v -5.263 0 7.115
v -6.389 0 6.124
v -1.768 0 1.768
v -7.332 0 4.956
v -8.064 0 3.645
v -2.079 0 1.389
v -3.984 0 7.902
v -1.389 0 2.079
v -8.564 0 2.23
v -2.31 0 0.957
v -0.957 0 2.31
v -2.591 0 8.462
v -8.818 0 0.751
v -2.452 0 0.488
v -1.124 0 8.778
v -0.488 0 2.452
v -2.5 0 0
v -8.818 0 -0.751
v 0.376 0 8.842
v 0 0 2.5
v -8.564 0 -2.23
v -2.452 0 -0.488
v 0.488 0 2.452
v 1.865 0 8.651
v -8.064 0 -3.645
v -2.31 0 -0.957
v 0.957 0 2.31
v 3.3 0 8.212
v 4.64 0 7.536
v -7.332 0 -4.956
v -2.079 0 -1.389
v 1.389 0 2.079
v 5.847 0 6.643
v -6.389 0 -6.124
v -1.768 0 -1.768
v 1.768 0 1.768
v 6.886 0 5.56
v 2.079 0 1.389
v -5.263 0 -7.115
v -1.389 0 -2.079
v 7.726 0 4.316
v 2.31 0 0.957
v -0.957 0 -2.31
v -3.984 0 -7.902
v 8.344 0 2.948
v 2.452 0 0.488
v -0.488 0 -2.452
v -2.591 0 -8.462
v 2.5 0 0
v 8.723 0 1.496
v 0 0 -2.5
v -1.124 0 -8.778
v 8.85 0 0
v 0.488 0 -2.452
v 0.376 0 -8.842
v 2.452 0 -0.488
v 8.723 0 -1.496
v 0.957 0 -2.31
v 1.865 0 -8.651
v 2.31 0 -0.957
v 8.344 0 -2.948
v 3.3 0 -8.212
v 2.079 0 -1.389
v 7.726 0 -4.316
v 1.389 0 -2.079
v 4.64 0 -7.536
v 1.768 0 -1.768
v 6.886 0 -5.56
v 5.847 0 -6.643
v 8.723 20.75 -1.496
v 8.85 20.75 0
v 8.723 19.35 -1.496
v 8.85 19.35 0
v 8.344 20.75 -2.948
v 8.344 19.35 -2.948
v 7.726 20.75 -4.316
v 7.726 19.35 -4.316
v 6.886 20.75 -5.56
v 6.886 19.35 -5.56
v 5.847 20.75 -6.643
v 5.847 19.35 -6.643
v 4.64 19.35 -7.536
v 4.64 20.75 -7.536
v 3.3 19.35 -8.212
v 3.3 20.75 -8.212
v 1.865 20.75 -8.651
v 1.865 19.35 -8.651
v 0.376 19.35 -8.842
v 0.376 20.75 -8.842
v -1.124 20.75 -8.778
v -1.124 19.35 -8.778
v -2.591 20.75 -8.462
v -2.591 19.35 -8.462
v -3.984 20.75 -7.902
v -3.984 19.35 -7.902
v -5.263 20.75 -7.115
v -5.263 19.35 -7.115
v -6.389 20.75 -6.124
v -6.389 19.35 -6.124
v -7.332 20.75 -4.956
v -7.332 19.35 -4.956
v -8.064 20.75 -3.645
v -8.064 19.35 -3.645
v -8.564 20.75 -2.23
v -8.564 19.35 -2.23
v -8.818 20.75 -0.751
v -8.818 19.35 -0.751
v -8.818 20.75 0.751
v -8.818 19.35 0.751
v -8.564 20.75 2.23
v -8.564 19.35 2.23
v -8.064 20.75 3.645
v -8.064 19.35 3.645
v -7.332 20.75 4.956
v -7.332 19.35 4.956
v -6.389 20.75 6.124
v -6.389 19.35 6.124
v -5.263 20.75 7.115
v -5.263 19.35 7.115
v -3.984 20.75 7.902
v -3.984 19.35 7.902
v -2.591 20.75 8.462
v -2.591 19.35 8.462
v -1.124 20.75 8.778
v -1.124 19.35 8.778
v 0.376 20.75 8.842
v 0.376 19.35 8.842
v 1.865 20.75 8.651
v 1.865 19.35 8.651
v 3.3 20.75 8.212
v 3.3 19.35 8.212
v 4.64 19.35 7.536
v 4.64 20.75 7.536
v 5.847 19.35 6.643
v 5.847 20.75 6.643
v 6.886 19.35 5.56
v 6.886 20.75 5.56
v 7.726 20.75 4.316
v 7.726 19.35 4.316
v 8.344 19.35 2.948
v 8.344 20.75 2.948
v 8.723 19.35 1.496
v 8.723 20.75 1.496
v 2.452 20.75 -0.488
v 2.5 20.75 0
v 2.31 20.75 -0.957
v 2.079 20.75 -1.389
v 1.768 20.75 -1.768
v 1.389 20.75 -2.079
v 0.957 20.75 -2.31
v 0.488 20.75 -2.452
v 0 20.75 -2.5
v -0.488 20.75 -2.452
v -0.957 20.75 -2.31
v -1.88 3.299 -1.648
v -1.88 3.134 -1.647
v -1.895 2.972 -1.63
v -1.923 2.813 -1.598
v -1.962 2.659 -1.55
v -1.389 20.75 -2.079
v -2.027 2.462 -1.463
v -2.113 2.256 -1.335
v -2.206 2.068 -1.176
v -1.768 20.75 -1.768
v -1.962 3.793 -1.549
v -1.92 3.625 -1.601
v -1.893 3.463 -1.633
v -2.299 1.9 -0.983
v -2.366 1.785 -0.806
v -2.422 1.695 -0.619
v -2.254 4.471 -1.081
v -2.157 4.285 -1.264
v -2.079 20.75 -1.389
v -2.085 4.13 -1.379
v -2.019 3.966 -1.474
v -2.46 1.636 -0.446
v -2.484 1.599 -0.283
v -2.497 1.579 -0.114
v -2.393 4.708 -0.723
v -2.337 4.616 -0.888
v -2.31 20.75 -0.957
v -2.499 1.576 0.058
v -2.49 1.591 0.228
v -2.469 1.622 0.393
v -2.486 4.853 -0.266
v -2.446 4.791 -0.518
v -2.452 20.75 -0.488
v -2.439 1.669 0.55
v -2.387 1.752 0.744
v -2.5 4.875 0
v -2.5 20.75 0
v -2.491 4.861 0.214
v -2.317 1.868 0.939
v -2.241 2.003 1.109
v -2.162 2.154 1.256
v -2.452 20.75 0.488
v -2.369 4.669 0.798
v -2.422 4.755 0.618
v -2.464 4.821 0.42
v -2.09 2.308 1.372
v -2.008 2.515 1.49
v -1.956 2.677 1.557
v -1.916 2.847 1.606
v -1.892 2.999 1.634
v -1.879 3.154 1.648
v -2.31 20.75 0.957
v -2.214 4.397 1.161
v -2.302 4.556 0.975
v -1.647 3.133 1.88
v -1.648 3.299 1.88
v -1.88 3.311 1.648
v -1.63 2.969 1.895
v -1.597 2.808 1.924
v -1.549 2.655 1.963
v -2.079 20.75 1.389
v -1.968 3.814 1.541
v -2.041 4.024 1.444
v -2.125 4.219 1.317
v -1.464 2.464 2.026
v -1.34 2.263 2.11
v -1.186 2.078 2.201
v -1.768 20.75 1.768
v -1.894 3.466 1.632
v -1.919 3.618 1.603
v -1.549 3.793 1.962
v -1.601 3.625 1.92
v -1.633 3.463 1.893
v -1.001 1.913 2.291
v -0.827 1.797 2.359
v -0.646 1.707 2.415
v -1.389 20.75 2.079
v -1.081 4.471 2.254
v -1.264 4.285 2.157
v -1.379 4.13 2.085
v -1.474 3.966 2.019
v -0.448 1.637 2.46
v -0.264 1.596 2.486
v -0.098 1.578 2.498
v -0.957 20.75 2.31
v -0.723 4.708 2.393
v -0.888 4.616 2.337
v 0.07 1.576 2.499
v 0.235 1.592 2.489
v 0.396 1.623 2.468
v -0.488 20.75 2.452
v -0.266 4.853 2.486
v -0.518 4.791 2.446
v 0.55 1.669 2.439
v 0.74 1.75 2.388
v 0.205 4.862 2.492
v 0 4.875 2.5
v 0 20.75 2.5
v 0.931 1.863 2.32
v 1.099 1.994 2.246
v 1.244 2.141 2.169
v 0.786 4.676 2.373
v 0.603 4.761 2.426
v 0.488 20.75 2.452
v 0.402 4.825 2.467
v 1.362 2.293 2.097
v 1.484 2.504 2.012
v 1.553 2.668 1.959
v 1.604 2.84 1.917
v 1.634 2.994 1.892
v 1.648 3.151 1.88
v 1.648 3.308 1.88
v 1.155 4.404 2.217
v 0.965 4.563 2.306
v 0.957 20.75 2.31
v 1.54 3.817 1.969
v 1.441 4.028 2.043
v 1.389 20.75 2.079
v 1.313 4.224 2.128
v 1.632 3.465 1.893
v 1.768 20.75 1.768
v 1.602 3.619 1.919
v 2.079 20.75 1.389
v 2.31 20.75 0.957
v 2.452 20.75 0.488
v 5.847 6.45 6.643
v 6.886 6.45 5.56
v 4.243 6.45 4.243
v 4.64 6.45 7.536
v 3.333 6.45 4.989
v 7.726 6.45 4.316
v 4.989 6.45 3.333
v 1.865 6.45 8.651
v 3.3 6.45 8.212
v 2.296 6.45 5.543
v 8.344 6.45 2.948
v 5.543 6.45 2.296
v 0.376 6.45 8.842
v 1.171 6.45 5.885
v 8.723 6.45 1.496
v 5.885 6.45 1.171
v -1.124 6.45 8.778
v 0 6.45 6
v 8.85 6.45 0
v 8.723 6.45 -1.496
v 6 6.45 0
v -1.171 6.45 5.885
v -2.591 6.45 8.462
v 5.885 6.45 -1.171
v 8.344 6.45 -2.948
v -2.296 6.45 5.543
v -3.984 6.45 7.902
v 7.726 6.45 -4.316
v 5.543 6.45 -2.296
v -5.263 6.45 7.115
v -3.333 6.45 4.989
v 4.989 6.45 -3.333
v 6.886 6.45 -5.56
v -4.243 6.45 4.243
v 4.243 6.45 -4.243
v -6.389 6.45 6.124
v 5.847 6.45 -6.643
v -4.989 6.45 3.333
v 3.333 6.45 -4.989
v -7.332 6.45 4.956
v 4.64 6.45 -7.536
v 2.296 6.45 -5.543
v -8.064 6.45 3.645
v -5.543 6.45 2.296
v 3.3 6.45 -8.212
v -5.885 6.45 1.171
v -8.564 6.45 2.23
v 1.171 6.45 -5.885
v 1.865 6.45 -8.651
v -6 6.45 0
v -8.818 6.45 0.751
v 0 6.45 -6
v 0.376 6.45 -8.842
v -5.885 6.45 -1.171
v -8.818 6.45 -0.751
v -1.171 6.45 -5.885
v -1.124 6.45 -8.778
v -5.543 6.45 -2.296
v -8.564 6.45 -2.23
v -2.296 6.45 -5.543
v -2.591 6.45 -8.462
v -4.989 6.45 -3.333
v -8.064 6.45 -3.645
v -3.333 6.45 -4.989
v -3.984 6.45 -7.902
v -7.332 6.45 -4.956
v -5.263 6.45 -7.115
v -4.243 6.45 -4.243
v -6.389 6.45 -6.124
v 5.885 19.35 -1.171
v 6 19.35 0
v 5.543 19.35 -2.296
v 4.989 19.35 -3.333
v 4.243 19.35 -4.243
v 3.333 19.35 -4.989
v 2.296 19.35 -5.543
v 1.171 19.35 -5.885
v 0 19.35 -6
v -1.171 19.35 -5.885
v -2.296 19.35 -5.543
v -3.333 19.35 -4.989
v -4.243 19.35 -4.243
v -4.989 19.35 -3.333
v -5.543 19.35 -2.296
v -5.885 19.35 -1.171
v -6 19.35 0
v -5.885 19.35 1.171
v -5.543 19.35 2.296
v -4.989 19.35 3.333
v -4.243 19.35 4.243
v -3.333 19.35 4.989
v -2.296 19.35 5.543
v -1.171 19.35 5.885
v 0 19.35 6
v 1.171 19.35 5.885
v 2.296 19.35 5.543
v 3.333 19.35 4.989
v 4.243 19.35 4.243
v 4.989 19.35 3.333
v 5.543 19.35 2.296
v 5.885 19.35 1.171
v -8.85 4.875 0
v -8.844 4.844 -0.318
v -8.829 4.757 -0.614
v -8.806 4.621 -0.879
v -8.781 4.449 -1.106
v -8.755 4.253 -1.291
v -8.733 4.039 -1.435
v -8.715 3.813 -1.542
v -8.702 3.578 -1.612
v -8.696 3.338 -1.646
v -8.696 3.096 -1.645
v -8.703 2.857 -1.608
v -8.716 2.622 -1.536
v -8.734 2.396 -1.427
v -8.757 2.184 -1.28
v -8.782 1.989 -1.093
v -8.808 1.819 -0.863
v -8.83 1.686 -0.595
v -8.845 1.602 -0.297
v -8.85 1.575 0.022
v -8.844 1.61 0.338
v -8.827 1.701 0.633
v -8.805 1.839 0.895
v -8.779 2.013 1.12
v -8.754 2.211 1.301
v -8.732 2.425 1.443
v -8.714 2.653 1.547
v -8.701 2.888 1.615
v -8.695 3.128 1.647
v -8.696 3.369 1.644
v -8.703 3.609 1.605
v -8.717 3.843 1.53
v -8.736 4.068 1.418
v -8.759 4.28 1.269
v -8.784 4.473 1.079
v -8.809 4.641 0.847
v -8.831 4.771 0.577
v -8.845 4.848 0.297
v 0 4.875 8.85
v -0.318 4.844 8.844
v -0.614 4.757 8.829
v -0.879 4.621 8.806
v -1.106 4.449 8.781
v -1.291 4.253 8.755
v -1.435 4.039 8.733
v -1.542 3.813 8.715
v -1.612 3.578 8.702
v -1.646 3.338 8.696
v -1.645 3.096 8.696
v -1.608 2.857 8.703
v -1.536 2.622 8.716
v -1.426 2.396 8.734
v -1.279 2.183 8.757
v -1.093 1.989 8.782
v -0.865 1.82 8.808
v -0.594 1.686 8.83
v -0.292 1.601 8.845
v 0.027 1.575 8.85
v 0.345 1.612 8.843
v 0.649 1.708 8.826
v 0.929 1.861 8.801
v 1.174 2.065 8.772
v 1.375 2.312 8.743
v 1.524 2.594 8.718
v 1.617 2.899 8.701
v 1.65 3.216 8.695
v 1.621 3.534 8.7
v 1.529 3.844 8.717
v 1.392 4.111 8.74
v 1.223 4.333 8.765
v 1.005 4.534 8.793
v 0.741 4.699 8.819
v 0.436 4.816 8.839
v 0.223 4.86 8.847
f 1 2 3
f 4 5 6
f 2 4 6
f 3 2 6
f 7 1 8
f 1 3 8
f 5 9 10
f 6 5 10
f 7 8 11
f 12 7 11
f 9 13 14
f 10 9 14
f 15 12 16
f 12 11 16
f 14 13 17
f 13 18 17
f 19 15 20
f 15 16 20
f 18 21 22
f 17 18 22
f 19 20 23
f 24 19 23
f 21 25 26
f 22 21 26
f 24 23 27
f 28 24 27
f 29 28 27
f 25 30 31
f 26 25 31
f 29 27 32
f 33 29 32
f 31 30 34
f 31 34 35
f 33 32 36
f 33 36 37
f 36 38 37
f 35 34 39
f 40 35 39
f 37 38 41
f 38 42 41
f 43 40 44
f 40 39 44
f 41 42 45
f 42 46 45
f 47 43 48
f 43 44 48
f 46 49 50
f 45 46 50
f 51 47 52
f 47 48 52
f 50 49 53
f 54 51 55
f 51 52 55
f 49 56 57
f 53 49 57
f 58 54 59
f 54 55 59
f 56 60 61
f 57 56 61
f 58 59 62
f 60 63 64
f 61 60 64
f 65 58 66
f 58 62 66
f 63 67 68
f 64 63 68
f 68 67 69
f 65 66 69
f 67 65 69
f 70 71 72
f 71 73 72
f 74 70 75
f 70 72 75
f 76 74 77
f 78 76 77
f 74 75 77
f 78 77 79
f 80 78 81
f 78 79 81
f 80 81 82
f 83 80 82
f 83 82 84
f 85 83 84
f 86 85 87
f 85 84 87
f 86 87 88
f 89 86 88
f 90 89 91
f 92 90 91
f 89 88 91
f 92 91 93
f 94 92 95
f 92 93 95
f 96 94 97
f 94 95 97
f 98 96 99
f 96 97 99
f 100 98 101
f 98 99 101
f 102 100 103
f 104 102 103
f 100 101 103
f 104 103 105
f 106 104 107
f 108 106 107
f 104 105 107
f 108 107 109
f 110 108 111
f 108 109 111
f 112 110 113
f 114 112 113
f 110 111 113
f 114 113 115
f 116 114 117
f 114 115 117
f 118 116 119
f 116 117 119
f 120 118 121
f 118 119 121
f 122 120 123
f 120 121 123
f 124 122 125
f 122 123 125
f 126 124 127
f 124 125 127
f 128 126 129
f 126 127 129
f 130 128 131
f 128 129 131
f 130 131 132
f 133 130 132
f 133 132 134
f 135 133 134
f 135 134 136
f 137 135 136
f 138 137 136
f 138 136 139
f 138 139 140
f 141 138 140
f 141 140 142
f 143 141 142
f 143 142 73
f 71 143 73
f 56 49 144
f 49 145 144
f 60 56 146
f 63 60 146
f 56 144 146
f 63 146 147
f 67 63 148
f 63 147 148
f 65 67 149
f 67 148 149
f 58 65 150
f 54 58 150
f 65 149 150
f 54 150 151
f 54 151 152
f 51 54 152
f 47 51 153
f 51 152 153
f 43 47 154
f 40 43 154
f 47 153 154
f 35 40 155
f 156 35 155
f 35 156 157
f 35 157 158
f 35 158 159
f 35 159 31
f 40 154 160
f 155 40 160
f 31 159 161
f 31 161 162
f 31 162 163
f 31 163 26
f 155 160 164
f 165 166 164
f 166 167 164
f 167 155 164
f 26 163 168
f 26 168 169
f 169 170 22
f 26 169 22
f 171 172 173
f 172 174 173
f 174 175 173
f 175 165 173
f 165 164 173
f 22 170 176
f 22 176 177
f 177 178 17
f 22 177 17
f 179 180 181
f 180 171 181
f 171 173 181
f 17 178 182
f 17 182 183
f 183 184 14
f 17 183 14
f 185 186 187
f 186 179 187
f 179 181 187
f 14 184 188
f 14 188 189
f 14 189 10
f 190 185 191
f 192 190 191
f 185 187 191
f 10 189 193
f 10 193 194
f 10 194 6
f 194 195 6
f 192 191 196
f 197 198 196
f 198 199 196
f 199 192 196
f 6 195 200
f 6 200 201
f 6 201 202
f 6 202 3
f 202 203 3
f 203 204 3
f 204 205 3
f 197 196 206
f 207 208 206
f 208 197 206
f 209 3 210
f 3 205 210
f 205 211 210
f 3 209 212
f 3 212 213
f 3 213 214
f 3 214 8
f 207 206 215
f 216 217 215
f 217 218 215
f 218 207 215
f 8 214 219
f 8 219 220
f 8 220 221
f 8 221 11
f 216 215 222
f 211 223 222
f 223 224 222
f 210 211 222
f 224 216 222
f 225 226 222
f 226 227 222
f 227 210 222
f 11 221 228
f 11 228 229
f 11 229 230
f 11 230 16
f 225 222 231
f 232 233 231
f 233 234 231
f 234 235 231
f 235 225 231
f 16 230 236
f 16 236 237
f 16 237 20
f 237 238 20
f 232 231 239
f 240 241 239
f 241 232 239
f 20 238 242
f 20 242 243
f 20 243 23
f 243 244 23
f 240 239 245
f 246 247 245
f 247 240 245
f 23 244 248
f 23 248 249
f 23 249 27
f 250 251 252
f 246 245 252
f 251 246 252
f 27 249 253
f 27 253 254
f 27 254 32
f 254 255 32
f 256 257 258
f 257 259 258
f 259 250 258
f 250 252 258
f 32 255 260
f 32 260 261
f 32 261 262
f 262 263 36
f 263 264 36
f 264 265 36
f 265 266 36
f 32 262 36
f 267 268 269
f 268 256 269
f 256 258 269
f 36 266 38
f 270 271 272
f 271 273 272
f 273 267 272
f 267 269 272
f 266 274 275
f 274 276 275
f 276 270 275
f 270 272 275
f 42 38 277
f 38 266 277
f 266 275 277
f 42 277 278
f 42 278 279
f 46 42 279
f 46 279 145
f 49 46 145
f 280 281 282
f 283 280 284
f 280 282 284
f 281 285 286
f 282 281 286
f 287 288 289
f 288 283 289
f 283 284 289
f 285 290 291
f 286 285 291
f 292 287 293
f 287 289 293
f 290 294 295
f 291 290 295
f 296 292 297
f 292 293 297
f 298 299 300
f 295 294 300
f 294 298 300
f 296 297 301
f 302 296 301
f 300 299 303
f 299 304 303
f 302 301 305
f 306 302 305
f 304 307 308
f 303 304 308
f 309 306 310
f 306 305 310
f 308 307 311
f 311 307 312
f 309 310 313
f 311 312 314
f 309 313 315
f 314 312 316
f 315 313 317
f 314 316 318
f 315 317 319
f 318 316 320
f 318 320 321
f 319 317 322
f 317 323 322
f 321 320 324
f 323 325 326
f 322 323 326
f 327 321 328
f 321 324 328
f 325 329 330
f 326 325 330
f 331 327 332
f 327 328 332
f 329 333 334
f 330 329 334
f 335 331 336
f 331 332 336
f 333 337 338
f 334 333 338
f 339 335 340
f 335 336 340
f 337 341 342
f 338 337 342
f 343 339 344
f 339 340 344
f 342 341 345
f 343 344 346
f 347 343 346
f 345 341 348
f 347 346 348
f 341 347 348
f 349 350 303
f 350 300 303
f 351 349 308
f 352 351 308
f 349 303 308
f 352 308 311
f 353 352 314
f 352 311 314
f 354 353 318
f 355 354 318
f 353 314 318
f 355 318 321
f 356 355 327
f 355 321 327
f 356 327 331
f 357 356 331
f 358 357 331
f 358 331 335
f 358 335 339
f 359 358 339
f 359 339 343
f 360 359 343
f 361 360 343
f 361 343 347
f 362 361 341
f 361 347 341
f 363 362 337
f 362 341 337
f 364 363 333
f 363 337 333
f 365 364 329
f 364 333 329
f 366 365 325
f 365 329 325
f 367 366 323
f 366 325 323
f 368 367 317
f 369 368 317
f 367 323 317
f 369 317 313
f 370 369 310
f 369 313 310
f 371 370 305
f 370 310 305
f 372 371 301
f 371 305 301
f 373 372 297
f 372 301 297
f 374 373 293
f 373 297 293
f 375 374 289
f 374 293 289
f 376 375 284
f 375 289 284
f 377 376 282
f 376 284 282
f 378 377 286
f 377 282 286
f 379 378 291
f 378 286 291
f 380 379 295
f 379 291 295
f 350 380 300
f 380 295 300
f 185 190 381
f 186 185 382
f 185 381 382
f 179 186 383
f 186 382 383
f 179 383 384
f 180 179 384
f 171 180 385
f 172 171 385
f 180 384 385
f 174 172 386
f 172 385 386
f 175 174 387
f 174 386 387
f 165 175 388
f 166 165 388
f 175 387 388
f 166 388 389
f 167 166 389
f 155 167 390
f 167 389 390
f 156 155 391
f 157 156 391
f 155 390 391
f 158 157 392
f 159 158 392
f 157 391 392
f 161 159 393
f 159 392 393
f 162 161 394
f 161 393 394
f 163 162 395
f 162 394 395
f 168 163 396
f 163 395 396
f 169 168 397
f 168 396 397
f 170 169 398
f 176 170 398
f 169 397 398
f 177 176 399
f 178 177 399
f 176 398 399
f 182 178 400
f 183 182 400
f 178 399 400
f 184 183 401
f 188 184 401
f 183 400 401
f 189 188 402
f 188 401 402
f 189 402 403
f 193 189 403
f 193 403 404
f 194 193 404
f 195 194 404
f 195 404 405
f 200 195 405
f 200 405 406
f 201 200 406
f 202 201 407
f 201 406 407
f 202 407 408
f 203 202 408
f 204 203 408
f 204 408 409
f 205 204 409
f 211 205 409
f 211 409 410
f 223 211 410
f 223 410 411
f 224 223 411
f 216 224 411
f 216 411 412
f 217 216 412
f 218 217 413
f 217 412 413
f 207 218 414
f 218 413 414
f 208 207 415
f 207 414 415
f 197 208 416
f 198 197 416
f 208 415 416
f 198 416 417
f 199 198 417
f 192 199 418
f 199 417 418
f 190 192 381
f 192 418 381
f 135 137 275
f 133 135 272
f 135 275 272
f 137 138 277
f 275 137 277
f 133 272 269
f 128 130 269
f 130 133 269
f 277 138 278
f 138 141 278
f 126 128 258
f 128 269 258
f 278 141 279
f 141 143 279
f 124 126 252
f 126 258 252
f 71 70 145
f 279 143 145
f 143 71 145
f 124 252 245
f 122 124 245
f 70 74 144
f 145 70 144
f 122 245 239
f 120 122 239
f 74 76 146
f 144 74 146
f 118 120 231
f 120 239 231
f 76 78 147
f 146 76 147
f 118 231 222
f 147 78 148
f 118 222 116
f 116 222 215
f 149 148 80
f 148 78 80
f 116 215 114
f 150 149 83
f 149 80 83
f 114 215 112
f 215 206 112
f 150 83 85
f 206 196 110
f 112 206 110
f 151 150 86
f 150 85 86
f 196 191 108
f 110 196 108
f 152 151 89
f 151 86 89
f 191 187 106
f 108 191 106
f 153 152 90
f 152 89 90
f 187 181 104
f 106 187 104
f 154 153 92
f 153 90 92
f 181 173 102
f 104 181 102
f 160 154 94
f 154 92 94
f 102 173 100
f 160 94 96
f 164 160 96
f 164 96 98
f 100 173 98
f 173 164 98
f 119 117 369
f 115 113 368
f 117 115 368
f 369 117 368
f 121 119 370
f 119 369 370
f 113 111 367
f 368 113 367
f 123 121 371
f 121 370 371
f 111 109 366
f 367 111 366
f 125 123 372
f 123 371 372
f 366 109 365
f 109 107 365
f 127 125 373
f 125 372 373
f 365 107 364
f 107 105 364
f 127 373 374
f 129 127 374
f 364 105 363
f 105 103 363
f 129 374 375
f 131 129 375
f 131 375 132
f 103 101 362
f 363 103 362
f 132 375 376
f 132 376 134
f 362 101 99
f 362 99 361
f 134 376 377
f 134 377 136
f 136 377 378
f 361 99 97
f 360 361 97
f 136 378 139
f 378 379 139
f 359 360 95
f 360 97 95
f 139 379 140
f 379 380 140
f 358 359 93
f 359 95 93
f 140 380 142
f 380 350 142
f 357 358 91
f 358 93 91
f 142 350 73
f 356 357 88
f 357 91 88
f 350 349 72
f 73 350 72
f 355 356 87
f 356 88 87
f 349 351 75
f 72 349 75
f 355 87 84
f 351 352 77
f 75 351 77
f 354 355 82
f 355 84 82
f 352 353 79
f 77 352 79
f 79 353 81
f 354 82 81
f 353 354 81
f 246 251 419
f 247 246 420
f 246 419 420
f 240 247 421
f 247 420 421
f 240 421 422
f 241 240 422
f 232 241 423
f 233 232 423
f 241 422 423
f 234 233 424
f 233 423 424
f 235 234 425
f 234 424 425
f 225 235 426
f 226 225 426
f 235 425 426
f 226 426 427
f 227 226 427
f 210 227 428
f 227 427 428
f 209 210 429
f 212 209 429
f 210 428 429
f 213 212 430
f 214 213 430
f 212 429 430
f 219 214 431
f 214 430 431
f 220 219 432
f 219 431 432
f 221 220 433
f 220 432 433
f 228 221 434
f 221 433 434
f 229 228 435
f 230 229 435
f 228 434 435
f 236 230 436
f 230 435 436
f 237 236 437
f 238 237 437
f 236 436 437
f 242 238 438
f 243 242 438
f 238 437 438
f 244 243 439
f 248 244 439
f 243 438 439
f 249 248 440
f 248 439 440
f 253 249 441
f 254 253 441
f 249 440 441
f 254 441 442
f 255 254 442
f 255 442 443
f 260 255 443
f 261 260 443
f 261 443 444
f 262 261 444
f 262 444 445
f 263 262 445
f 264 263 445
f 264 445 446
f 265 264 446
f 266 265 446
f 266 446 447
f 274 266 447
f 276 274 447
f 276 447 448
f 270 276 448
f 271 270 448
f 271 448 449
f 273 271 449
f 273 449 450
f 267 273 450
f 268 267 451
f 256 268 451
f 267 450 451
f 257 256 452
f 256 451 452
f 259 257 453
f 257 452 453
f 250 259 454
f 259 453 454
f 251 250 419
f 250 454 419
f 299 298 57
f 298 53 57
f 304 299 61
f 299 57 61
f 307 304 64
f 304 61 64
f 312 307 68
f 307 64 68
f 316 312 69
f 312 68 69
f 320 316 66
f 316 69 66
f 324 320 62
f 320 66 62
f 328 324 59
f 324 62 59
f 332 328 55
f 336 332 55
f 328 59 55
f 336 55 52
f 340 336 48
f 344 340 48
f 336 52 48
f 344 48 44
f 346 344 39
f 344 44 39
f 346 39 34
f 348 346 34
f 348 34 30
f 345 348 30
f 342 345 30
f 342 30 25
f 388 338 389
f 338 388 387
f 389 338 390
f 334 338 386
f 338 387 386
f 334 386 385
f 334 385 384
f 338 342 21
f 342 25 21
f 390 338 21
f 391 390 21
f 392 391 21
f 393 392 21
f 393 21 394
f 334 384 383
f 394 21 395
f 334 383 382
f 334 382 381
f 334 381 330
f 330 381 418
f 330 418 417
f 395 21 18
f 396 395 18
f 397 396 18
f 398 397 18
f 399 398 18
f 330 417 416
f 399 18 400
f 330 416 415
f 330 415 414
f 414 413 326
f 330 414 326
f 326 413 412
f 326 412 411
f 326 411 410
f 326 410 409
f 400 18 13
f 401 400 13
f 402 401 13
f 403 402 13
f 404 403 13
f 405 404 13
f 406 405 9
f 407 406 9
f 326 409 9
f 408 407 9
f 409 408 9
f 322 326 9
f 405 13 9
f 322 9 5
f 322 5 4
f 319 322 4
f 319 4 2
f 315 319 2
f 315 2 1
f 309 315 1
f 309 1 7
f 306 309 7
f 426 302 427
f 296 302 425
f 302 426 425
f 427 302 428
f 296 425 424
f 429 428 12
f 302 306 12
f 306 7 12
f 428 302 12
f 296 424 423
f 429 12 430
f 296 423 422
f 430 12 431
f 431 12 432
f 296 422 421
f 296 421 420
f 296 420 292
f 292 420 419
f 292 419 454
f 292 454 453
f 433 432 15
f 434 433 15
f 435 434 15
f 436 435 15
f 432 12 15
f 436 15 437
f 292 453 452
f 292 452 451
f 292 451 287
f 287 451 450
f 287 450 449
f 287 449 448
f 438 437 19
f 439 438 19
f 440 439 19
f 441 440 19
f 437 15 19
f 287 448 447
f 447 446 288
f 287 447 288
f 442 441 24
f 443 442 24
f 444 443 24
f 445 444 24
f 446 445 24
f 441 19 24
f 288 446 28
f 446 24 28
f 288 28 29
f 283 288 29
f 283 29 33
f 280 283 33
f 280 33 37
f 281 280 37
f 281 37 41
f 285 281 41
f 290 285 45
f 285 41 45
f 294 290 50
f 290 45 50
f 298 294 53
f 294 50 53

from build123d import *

# Parameters (mm, degrees)
CROQUIS3_W     = 1.65
CROQUIS3_H     = 8.851
MATRIZC1_COUNT = 2
MATRIZC1_ANGLE = 90


with BuildPart() as part:
    # Croquis1 → Revolución1 (revolve)
    with BuildSketch(Plane.XY):
        Polygon((8.85, 6.45), (8.85, 0), (2.5, 0), (2.5, 20.75), (8.85, 20.75), (8.85, 19.35), (6, 19.35), (6, 6.45), align=None)
    revolve(axis=Axis((0, 0, 0), (0, 1, 0)))

    # Croquis3 → Taladro roscado M41 (revolve, cut)
    with BuildSketch(Plane(origin=(0, 3.225, 0), x_dir=(0, 1, 0), z_dir=(1, 0, 0))):
        with Locations((0.825, 4.4255)):
            Rectangle(CROQUIS3_W, CROQUIS3_H)
    taladro_roscado_m41 = revolve(axis=Axis((0, 3.225, -6.35), (0, 0, 1)), mode=Mode.SUBTRACT)

    # MatrizC1: Taladro roscado M41 ×2 about axis
    matrizc1_axis = Axis((0, 0, 0), (0, -1, 0))
    for i in range(1, MATRIZC1_COUNT):
        add(taladro_roscado_m41.rotate(matrizc1_axis, i * MATRIZC1_ANGLE / (MATRIZC1_COUNT - 1)), mode=Mode.SUBTRACT)


solid = part.part
